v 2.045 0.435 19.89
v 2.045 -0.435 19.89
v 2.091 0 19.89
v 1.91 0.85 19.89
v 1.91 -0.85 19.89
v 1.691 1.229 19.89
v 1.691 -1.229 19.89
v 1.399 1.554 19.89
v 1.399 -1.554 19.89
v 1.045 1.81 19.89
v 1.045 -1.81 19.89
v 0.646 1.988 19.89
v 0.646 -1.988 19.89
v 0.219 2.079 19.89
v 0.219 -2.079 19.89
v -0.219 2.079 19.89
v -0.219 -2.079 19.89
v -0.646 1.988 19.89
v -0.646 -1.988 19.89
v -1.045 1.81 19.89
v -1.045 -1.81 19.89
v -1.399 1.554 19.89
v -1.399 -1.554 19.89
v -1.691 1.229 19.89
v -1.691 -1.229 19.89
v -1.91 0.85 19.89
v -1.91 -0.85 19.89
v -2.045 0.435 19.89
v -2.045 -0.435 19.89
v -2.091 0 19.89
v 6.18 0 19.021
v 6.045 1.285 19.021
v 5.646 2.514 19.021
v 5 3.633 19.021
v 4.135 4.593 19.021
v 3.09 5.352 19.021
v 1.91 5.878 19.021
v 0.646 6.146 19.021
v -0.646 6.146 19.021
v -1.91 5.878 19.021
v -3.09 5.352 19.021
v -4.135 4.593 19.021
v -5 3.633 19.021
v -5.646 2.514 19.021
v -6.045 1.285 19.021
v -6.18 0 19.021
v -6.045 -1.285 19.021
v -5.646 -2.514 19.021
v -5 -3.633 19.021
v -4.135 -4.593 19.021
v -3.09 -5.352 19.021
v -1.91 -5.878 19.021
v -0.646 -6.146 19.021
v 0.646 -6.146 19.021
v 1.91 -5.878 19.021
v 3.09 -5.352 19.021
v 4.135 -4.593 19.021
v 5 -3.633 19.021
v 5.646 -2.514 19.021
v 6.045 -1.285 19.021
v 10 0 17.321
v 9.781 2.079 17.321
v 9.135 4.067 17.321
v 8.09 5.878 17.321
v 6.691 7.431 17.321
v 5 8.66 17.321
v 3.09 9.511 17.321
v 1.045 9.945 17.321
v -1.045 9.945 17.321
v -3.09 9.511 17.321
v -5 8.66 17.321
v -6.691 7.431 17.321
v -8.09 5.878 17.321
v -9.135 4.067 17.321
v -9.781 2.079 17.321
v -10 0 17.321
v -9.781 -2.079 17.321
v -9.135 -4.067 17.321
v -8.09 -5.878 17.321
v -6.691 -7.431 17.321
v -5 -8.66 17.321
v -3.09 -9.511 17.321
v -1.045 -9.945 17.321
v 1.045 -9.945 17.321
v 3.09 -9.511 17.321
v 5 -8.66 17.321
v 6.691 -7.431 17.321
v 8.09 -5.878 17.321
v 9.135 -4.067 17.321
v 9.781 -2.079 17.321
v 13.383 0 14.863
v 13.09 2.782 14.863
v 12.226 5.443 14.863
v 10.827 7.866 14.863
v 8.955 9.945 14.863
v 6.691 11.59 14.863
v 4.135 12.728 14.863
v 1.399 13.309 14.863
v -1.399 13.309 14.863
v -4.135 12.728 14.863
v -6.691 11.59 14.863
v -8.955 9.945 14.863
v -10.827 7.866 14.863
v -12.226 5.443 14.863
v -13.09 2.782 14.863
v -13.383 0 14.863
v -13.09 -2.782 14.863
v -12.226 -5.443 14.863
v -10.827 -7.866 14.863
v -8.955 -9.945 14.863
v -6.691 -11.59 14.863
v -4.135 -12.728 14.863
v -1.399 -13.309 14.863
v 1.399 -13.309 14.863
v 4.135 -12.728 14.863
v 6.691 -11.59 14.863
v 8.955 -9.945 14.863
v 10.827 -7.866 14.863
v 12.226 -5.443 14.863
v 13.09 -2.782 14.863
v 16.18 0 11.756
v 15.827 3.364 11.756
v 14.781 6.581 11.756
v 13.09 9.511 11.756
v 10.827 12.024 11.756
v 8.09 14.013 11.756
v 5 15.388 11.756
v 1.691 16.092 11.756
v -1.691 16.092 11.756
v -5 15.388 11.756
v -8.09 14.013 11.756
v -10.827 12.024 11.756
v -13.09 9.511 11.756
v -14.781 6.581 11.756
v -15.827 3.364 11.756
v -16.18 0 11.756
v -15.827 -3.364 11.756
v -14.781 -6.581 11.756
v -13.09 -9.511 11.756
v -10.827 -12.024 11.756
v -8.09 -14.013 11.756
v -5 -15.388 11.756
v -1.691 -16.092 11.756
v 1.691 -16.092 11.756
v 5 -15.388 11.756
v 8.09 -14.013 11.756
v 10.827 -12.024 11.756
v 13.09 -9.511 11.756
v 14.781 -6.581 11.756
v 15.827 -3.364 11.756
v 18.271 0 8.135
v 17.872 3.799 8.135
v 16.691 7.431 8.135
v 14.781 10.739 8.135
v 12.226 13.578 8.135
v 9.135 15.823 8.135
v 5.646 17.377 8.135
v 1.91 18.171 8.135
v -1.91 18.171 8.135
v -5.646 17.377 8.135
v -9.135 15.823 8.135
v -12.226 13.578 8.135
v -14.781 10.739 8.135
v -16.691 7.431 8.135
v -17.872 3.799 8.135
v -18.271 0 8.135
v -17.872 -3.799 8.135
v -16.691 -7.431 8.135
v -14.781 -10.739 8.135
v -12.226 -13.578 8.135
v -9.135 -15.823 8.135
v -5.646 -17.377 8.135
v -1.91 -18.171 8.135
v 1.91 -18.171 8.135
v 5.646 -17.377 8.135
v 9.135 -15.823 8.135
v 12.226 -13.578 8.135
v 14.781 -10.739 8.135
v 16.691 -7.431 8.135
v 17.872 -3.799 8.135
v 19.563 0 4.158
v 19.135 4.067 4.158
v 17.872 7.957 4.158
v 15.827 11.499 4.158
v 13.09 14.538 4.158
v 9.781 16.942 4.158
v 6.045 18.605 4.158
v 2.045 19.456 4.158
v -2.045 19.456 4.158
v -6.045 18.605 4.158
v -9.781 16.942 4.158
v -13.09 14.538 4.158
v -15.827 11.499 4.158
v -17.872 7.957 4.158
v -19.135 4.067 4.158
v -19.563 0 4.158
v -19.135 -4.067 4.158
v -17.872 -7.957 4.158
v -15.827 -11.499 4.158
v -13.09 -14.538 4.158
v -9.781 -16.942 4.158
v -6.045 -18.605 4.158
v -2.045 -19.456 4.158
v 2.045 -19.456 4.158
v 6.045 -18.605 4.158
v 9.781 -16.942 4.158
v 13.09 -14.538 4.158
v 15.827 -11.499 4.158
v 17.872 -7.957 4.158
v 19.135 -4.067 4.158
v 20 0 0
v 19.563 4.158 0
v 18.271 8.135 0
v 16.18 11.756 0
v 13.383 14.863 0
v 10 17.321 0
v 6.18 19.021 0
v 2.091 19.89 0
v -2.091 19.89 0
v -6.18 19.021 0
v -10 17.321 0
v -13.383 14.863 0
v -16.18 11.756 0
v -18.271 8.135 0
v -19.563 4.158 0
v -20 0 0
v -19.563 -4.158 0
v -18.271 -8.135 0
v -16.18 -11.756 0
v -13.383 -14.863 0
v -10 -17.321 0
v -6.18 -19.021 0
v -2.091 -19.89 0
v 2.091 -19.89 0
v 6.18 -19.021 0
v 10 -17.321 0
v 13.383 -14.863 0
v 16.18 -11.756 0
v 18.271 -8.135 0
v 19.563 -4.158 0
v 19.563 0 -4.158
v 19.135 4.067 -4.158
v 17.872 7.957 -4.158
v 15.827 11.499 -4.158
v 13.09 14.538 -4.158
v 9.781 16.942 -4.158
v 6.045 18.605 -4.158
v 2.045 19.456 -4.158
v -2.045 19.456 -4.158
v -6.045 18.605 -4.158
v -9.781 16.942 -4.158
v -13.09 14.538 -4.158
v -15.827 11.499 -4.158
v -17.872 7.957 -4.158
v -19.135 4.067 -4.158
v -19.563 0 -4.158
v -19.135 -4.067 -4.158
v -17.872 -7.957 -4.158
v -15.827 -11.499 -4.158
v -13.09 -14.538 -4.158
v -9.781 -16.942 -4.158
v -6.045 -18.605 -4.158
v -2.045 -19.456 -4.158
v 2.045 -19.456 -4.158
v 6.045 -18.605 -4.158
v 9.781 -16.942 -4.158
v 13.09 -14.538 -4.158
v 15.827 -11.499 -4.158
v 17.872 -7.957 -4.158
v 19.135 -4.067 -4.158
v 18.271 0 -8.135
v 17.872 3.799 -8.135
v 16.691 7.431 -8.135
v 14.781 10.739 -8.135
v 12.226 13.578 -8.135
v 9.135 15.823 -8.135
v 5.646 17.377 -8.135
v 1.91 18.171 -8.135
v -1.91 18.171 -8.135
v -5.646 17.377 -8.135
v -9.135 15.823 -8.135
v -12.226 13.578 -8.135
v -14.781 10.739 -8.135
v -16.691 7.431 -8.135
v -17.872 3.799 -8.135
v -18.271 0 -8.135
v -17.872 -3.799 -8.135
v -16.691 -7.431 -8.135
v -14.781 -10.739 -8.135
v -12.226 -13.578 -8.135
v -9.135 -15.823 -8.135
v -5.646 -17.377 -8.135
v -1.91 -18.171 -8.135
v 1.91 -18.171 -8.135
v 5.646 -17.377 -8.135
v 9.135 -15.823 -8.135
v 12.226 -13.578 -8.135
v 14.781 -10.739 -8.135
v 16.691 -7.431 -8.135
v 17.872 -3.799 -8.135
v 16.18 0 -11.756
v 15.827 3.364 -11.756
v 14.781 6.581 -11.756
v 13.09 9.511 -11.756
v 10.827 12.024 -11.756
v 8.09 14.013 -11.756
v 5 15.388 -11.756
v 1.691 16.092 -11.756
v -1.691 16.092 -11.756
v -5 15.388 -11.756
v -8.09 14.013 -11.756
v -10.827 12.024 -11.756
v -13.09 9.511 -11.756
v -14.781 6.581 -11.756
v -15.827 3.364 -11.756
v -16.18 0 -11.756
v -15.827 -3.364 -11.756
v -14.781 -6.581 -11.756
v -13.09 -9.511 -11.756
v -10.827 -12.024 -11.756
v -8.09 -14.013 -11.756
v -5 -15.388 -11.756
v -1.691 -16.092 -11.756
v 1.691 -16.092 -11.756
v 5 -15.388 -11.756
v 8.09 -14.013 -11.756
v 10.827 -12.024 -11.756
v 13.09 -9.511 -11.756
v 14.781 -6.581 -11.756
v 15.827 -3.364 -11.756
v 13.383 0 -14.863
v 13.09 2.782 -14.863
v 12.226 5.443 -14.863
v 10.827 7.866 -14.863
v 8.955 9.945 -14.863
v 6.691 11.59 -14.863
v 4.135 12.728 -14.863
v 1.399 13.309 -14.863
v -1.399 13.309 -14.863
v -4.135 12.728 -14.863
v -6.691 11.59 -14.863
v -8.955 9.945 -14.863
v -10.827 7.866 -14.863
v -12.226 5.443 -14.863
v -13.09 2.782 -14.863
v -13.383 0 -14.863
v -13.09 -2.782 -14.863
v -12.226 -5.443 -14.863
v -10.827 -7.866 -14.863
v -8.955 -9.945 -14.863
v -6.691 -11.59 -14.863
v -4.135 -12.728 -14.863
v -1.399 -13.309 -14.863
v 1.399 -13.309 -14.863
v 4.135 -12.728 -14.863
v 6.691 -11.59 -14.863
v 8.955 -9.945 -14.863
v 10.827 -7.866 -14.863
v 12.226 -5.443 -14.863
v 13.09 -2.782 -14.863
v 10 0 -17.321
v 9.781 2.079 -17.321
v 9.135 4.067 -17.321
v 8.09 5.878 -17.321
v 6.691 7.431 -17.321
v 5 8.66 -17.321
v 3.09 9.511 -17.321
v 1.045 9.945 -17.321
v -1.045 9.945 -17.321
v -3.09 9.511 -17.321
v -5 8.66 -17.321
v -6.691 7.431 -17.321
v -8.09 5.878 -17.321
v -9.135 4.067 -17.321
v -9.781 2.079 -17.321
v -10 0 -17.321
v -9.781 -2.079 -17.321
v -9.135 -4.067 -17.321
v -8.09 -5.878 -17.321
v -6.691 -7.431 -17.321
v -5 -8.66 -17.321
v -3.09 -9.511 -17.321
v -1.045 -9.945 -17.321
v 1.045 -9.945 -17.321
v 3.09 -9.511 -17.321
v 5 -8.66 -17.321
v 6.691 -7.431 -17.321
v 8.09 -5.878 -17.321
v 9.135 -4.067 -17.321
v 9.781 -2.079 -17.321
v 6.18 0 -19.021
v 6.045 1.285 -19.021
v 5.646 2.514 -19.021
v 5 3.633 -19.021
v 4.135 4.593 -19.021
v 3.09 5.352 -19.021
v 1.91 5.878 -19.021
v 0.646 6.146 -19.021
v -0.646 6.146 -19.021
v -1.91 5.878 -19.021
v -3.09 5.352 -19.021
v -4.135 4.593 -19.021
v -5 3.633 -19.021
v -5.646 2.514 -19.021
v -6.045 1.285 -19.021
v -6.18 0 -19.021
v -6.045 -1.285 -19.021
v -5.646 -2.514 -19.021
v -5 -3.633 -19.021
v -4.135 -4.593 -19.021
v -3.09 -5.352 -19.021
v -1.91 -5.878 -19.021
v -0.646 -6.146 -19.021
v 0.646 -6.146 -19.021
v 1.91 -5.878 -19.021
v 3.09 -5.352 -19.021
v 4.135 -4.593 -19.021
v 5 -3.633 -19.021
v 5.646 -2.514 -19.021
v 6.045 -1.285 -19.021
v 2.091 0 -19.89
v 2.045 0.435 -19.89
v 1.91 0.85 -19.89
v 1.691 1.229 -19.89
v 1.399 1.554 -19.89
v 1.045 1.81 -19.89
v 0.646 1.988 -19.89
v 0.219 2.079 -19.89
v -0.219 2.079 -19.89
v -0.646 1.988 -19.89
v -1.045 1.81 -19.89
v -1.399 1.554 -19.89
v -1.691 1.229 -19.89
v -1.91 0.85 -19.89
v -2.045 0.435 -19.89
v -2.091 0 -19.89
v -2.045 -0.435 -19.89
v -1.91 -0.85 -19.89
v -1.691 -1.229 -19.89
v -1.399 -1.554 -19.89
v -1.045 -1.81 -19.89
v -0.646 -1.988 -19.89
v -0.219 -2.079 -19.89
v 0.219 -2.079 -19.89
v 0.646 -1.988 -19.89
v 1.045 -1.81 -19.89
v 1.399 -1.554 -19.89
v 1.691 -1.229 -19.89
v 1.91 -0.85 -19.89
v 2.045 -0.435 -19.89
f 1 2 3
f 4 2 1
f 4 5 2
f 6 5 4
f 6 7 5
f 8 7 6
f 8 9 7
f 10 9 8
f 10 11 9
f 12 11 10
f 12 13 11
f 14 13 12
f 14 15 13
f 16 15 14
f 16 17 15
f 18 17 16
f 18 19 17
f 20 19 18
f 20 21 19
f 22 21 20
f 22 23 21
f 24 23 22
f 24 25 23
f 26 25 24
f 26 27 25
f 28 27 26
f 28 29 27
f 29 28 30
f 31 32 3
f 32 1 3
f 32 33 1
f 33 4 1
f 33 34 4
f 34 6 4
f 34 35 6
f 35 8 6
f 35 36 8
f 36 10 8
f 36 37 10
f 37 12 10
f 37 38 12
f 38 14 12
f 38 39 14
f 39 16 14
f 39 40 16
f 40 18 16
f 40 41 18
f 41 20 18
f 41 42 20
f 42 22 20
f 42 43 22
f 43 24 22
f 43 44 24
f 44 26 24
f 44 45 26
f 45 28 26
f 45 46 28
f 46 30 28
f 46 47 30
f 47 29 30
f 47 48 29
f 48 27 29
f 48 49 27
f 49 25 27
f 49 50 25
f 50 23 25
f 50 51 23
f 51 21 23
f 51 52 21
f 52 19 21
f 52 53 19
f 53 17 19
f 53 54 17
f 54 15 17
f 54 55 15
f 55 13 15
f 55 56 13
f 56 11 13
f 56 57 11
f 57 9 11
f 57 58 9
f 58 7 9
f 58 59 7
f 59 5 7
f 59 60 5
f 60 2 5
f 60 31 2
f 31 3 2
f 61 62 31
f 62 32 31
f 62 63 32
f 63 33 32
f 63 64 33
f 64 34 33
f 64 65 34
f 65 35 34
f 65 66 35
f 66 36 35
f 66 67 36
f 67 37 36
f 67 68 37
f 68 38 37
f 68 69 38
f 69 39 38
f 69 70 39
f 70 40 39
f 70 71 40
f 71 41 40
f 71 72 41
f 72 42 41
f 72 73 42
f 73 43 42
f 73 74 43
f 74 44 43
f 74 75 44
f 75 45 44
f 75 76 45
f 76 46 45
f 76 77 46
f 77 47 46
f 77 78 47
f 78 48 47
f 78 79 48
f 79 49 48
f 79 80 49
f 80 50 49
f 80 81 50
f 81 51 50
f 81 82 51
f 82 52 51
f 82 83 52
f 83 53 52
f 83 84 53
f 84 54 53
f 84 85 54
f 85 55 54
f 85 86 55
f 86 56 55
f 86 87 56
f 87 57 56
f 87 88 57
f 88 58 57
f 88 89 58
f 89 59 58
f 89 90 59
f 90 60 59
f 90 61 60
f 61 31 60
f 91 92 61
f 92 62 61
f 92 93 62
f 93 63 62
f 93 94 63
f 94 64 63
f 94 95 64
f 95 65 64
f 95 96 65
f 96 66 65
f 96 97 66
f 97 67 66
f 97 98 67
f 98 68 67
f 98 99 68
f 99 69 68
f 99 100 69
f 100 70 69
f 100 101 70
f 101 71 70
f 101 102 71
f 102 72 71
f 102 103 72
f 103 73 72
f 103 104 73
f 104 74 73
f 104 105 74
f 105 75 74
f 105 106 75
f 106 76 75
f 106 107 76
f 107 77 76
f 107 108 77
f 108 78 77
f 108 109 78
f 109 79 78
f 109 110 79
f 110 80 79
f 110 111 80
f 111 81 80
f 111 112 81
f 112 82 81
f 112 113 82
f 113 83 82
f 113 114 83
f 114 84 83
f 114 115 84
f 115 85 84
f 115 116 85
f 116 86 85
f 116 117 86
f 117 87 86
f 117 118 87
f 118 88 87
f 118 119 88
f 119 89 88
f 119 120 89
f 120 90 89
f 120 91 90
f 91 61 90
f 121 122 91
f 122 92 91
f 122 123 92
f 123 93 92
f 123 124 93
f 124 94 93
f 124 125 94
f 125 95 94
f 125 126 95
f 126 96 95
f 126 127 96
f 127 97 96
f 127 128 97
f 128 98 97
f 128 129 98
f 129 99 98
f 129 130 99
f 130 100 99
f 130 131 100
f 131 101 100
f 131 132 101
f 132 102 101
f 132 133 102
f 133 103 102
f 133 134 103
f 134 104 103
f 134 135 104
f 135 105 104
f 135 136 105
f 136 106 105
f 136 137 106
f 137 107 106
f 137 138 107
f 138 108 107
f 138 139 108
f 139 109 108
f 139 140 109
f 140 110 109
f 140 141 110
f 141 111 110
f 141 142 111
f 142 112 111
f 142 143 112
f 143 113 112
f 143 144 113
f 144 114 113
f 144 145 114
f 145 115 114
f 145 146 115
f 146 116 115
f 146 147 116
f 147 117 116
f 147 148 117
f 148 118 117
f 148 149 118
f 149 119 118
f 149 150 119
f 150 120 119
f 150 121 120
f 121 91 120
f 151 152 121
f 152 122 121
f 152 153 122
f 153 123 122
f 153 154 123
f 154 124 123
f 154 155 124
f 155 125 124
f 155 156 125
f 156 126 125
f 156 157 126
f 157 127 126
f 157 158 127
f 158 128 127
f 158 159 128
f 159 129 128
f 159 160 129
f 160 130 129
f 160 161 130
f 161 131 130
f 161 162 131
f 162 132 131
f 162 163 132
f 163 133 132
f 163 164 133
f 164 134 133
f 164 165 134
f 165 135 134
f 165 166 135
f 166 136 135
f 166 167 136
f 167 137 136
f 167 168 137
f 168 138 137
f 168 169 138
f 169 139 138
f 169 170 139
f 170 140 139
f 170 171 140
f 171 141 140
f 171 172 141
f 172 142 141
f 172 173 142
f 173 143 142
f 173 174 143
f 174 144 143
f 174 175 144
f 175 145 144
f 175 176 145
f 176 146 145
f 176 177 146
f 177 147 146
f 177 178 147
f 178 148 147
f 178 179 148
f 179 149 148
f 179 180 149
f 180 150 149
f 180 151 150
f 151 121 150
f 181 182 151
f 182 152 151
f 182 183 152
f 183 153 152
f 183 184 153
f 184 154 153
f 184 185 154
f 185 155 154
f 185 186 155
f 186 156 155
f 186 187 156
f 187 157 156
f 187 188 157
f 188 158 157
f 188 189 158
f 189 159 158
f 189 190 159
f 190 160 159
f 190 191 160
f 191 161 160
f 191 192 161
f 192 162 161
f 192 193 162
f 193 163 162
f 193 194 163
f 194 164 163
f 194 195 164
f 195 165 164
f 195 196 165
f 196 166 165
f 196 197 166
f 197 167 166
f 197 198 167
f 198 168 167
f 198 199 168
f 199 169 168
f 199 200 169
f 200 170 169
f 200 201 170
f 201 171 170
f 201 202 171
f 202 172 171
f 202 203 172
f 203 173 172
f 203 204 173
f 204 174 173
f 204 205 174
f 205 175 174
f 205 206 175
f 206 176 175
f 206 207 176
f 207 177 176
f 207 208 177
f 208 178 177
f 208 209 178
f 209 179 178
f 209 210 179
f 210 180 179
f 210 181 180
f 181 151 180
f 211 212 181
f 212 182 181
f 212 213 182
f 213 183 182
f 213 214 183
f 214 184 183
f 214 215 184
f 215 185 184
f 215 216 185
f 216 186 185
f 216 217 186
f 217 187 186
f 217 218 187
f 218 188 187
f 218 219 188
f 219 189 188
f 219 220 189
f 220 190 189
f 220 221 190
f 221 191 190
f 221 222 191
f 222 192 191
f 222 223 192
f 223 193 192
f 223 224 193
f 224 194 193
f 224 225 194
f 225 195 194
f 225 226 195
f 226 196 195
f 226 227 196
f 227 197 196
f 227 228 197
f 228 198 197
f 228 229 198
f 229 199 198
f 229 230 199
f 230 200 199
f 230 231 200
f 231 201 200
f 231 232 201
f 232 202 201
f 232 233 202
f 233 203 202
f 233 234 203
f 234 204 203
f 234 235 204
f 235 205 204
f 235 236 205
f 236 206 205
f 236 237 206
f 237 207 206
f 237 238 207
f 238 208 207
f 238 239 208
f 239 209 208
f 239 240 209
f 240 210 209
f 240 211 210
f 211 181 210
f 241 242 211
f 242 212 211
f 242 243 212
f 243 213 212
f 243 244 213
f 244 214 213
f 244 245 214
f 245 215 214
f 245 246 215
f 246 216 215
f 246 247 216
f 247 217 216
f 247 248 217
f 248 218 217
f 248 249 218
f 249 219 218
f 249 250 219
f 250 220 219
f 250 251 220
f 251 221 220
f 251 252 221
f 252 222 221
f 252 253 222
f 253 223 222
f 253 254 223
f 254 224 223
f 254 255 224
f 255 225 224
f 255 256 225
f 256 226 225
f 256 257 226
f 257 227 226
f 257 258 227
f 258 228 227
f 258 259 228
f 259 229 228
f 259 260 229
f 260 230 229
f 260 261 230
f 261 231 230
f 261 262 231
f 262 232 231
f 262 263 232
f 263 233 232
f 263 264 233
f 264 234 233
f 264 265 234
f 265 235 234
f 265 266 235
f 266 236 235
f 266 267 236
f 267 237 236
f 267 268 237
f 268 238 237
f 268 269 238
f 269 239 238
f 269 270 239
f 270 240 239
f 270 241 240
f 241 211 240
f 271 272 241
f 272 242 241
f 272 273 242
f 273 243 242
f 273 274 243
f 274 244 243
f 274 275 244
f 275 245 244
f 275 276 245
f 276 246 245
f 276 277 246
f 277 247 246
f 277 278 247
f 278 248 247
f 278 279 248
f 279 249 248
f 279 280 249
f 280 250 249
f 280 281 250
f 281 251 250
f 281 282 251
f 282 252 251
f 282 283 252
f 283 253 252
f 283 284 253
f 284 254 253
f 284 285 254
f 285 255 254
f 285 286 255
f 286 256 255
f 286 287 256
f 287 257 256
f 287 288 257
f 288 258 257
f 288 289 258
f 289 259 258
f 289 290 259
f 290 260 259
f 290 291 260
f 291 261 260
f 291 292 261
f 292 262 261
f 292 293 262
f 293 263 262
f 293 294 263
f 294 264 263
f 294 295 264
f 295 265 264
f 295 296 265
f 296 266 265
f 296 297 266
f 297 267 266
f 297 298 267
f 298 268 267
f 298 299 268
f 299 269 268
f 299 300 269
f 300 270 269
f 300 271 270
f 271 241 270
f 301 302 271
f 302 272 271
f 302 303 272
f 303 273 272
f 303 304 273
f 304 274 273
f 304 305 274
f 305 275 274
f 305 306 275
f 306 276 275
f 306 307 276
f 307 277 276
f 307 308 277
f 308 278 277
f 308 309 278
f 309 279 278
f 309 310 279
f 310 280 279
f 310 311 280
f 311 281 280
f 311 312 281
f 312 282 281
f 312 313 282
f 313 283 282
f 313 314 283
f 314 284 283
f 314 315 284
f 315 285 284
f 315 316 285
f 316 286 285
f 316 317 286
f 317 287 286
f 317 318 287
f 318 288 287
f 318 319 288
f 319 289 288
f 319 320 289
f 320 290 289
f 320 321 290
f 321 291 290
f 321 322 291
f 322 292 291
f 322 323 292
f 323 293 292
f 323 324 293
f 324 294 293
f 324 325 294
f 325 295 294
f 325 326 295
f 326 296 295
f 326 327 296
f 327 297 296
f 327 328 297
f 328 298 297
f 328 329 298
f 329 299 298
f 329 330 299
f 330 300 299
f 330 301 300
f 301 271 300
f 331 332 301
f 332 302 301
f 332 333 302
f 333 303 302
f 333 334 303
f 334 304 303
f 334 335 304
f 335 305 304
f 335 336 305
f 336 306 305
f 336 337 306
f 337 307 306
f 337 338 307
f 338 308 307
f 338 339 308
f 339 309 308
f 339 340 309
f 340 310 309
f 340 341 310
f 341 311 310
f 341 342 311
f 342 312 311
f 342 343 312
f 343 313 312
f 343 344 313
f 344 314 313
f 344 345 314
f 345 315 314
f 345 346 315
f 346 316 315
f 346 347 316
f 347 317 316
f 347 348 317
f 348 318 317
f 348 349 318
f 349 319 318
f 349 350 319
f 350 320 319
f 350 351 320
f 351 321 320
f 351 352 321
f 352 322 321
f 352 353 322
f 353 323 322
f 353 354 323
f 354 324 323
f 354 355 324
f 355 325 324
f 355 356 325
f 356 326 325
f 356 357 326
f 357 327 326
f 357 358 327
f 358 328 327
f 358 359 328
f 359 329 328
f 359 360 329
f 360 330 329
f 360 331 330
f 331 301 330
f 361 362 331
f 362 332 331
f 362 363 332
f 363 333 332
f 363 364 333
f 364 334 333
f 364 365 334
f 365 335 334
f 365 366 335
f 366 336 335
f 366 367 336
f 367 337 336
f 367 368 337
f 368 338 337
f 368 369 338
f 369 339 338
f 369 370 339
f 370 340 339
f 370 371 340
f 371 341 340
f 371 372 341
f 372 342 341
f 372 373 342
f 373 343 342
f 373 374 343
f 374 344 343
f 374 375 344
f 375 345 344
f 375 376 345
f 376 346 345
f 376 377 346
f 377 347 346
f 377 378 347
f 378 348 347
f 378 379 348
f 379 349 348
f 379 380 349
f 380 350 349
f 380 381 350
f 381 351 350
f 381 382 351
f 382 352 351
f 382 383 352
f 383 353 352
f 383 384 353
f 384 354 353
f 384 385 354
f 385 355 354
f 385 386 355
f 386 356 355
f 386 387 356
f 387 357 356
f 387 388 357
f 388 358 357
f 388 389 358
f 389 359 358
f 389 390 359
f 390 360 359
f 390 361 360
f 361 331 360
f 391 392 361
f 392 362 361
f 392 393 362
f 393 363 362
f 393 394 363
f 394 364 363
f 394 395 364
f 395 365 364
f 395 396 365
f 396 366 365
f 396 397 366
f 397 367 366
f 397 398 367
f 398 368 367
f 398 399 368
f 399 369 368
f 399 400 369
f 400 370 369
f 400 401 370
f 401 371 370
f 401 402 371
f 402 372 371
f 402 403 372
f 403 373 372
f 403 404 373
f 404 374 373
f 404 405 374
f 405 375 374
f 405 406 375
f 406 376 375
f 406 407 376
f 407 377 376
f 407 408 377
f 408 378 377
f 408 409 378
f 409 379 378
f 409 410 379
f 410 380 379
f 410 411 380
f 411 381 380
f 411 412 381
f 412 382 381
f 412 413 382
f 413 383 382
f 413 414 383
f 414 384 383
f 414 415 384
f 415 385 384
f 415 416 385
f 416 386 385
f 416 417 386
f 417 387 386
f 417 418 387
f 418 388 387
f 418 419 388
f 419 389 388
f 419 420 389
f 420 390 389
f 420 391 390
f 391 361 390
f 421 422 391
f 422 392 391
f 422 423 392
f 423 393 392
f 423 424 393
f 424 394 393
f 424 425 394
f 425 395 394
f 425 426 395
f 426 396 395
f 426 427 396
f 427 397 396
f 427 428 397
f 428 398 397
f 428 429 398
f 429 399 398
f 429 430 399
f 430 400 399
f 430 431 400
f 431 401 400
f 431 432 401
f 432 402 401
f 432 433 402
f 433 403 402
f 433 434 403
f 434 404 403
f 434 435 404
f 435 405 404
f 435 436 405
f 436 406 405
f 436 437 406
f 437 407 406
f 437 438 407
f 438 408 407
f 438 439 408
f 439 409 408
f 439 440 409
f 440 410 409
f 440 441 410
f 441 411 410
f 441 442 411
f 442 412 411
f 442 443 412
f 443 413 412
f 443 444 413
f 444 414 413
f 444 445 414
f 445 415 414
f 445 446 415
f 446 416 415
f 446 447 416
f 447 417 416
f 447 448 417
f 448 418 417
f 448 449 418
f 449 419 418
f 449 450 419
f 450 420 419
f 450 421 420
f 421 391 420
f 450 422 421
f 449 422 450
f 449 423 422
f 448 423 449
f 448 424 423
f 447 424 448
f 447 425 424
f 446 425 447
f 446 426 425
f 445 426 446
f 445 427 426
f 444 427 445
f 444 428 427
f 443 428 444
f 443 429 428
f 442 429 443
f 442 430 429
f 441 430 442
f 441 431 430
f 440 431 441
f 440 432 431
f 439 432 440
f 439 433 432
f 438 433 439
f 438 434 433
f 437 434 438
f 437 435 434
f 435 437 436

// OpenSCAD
// Unit of length: Unit.INCH
sphere(d = 40.0, $fa = 12.0, $fs = 2.0, $fn = 0);
